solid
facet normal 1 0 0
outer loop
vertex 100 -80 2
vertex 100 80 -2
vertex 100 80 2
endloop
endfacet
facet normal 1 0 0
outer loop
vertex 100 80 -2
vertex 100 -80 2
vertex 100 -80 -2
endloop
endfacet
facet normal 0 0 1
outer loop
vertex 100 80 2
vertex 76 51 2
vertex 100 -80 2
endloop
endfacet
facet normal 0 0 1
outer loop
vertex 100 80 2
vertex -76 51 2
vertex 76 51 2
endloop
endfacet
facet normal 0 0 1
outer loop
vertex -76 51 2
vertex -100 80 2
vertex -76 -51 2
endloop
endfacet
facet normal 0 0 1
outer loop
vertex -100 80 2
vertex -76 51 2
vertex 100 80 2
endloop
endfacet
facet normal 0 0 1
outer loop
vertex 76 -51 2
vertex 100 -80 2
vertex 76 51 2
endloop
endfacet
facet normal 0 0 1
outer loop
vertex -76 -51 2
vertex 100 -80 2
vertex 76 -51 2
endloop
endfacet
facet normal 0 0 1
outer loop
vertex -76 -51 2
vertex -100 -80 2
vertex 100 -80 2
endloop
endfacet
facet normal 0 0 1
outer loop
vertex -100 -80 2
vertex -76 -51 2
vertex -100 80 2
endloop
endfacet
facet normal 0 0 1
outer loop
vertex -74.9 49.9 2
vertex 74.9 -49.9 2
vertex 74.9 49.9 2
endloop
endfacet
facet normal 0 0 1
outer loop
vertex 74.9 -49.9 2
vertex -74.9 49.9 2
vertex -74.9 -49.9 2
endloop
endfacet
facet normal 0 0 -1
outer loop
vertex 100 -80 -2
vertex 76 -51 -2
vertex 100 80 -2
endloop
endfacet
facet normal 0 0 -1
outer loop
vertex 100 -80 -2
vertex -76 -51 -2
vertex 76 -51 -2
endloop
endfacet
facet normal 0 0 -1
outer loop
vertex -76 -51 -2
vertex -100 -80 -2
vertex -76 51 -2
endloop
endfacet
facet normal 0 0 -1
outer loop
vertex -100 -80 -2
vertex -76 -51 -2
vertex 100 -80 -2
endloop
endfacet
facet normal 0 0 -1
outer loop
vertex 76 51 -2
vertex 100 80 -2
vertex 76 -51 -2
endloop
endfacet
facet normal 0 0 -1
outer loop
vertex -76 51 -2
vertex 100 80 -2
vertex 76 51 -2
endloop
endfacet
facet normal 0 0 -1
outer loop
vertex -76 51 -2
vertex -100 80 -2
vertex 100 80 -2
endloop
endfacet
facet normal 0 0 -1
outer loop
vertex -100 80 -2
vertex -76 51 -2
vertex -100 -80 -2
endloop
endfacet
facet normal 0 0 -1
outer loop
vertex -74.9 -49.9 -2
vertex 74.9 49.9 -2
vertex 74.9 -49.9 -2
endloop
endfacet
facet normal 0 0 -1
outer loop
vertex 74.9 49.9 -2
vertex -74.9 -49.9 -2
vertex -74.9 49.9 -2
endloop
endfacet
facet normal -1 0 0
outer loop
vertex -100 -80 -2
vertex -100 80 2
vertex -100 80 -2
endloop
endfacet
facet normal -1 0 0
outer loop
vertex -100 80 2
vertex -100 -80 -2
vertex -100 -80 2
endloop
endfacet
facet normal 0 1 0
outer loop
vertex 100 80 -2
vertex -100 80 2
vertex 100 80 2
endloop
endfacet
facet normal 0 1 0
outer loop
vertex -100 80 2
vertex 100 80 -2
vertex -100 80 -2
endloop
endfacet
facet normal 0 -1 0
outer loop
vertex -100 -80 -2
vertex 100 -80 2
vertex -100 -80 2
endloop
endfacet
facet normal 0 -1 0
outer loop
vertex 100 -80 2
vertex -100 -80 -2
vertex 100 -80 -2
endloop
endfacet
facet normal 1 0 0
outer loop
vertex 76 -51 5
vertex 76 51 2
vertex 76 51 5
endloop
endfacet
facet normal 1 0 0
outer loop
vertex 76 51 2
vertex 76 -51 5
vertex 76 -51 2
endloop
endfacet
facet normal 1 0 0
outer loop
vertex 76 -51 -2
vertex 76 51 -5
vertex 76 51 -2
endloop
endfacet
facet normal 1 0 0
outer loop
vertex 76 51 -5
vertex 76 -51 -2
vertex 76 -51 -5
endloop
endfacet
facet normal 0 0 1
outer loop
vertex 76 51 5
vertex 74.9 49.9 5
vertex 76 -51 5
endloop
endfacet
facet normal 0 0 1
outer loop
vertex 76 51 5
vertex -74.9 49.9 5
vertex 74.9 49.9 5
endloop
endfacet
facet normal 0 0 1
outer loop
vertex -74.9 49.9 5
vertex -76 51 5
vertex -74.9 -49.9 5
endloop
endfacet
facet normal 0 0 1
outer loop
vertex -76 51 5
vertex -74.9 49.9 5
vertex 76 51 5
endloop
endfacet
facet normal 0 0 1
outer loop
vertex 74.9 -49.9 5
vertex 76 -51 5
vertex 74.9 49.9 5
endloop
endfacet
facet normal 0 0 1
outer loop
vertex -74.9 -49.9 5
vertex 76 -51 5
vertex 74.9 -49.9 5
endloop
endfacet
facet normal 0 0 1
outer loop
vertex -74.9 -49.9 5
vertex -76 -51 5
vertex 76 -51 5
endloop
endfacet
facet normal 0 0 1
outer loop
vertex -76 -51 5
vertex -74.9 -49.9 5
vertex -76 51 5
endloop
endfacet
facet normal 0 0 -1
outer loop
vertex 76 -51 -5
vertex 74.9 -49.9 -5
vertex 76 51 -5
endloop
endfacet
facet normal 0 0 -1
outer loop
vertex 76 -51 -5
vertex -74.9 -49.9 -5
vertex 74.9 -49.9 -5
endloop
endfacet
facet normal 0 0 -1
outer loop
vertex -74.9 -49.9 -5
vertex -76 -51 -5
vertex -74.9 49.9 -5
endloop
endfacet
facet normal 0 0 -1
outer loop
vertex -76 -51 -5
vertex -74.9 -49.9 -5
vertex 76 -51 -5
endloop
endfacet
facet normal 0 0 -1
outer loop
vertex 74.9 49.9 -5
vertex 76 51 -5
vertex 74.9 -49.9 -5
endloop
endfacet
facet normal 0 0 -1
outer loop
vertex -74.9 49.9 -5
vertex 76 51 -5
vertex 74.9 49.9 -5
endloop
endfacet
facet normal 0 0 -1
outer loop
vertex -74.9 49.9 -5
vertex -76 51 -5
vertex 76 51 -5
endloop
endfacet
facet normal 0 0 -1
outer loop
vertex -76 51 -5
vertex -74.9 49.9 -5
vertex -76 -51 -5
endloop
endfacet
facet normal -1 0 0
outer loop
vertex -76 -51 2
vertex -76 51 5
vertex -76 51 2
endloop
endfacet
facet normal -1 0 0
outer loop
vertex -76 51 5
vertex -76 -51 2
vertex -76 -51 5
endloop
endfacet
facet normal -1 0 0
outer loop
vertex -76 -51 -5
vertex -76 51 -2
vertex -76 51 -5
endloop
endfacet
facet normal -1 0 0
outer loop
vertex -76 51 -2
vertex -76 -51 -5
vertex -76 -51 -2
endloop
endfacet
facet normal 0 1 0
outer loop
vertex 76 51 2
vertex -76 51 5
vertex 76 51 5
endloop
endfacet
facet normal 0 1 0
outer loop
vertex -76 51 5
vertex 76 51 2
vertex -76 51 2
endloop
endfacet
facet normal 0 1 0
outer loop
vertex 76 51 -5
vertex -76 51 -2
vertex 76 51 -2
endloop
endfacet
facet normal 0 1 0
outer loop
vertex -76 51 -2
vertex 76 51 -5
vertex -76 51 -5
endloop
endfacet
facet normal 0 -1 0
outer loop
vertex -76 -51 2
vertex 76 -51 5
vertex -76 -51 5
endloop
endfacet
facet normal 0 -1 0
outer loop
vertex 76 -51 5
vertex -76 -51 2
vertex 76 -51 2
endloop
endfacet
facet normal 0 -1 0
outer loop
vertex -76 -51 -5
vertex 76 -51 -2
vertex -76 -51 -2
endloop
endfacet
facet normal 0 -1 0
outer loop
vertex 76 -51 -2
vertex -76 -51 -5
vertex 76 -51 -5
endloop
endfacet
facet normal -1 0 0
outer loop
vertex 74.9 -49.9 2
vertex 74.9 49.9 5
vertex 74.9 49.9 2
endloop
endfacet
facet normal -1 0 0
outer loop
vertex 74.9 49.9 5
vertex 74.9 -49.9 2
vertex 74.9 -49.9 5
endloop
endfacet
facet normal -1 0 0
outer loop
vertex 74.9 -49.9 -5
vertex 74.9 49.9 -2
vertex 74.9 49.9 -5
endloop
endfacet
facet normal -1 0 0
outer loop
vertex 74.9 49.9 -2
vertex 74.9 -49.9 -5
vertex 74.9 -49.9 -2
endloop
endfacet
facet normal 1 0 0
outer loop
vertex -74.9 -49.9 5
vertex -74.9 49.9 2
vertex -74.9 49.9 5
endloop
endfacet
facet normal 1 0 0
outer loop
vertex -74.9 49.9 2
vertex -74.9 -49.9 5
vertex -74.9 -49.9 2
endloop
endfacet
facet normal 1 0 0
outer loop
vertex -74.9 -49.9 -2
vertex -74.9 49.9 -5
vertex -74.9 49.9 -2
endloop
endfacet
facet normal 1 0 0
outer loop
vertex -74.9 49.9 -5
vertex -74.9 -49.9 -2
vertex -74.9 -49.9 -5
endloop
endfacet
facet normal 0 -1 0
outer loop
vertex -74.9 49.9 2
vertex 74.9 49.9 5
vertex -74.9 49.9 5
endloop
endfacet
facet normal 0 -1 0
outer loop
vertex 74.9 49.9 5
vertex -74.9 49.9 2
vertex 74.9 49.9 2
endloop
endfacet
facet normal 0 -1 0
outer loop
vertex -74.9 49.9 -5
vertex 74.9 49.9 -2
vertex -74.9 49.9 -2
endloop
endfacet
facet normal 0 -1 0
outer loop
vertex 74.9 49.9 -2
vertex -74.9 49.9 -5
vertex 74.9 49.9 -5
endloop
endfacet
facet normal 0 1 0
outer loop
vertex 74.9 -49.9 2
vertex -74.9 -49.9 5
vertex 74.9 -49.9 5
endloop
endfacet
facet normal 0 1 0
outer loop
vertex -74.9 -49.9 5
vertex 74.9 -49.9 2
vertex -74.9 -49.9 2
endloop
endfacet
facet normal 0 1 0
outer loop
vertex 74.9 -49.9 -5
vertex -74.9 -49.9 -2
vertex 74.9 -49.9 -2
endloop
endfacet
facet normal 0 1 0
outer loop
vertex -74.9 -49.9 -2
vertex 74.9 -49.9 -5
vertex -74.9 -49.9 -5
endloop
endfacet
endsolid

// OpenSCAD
file = "";
difference() {
    union() {
        cube([200, 160, 4], center = true);
    }
    translate([-75, -50, 0])
    linear_extrude(10, center = true, convexity = 3)
        import(file);
}

color("black") difference() {
    cube([152, 102, 10], center = true);
    cube([149.8, 99.8, 12], center = true);
}
